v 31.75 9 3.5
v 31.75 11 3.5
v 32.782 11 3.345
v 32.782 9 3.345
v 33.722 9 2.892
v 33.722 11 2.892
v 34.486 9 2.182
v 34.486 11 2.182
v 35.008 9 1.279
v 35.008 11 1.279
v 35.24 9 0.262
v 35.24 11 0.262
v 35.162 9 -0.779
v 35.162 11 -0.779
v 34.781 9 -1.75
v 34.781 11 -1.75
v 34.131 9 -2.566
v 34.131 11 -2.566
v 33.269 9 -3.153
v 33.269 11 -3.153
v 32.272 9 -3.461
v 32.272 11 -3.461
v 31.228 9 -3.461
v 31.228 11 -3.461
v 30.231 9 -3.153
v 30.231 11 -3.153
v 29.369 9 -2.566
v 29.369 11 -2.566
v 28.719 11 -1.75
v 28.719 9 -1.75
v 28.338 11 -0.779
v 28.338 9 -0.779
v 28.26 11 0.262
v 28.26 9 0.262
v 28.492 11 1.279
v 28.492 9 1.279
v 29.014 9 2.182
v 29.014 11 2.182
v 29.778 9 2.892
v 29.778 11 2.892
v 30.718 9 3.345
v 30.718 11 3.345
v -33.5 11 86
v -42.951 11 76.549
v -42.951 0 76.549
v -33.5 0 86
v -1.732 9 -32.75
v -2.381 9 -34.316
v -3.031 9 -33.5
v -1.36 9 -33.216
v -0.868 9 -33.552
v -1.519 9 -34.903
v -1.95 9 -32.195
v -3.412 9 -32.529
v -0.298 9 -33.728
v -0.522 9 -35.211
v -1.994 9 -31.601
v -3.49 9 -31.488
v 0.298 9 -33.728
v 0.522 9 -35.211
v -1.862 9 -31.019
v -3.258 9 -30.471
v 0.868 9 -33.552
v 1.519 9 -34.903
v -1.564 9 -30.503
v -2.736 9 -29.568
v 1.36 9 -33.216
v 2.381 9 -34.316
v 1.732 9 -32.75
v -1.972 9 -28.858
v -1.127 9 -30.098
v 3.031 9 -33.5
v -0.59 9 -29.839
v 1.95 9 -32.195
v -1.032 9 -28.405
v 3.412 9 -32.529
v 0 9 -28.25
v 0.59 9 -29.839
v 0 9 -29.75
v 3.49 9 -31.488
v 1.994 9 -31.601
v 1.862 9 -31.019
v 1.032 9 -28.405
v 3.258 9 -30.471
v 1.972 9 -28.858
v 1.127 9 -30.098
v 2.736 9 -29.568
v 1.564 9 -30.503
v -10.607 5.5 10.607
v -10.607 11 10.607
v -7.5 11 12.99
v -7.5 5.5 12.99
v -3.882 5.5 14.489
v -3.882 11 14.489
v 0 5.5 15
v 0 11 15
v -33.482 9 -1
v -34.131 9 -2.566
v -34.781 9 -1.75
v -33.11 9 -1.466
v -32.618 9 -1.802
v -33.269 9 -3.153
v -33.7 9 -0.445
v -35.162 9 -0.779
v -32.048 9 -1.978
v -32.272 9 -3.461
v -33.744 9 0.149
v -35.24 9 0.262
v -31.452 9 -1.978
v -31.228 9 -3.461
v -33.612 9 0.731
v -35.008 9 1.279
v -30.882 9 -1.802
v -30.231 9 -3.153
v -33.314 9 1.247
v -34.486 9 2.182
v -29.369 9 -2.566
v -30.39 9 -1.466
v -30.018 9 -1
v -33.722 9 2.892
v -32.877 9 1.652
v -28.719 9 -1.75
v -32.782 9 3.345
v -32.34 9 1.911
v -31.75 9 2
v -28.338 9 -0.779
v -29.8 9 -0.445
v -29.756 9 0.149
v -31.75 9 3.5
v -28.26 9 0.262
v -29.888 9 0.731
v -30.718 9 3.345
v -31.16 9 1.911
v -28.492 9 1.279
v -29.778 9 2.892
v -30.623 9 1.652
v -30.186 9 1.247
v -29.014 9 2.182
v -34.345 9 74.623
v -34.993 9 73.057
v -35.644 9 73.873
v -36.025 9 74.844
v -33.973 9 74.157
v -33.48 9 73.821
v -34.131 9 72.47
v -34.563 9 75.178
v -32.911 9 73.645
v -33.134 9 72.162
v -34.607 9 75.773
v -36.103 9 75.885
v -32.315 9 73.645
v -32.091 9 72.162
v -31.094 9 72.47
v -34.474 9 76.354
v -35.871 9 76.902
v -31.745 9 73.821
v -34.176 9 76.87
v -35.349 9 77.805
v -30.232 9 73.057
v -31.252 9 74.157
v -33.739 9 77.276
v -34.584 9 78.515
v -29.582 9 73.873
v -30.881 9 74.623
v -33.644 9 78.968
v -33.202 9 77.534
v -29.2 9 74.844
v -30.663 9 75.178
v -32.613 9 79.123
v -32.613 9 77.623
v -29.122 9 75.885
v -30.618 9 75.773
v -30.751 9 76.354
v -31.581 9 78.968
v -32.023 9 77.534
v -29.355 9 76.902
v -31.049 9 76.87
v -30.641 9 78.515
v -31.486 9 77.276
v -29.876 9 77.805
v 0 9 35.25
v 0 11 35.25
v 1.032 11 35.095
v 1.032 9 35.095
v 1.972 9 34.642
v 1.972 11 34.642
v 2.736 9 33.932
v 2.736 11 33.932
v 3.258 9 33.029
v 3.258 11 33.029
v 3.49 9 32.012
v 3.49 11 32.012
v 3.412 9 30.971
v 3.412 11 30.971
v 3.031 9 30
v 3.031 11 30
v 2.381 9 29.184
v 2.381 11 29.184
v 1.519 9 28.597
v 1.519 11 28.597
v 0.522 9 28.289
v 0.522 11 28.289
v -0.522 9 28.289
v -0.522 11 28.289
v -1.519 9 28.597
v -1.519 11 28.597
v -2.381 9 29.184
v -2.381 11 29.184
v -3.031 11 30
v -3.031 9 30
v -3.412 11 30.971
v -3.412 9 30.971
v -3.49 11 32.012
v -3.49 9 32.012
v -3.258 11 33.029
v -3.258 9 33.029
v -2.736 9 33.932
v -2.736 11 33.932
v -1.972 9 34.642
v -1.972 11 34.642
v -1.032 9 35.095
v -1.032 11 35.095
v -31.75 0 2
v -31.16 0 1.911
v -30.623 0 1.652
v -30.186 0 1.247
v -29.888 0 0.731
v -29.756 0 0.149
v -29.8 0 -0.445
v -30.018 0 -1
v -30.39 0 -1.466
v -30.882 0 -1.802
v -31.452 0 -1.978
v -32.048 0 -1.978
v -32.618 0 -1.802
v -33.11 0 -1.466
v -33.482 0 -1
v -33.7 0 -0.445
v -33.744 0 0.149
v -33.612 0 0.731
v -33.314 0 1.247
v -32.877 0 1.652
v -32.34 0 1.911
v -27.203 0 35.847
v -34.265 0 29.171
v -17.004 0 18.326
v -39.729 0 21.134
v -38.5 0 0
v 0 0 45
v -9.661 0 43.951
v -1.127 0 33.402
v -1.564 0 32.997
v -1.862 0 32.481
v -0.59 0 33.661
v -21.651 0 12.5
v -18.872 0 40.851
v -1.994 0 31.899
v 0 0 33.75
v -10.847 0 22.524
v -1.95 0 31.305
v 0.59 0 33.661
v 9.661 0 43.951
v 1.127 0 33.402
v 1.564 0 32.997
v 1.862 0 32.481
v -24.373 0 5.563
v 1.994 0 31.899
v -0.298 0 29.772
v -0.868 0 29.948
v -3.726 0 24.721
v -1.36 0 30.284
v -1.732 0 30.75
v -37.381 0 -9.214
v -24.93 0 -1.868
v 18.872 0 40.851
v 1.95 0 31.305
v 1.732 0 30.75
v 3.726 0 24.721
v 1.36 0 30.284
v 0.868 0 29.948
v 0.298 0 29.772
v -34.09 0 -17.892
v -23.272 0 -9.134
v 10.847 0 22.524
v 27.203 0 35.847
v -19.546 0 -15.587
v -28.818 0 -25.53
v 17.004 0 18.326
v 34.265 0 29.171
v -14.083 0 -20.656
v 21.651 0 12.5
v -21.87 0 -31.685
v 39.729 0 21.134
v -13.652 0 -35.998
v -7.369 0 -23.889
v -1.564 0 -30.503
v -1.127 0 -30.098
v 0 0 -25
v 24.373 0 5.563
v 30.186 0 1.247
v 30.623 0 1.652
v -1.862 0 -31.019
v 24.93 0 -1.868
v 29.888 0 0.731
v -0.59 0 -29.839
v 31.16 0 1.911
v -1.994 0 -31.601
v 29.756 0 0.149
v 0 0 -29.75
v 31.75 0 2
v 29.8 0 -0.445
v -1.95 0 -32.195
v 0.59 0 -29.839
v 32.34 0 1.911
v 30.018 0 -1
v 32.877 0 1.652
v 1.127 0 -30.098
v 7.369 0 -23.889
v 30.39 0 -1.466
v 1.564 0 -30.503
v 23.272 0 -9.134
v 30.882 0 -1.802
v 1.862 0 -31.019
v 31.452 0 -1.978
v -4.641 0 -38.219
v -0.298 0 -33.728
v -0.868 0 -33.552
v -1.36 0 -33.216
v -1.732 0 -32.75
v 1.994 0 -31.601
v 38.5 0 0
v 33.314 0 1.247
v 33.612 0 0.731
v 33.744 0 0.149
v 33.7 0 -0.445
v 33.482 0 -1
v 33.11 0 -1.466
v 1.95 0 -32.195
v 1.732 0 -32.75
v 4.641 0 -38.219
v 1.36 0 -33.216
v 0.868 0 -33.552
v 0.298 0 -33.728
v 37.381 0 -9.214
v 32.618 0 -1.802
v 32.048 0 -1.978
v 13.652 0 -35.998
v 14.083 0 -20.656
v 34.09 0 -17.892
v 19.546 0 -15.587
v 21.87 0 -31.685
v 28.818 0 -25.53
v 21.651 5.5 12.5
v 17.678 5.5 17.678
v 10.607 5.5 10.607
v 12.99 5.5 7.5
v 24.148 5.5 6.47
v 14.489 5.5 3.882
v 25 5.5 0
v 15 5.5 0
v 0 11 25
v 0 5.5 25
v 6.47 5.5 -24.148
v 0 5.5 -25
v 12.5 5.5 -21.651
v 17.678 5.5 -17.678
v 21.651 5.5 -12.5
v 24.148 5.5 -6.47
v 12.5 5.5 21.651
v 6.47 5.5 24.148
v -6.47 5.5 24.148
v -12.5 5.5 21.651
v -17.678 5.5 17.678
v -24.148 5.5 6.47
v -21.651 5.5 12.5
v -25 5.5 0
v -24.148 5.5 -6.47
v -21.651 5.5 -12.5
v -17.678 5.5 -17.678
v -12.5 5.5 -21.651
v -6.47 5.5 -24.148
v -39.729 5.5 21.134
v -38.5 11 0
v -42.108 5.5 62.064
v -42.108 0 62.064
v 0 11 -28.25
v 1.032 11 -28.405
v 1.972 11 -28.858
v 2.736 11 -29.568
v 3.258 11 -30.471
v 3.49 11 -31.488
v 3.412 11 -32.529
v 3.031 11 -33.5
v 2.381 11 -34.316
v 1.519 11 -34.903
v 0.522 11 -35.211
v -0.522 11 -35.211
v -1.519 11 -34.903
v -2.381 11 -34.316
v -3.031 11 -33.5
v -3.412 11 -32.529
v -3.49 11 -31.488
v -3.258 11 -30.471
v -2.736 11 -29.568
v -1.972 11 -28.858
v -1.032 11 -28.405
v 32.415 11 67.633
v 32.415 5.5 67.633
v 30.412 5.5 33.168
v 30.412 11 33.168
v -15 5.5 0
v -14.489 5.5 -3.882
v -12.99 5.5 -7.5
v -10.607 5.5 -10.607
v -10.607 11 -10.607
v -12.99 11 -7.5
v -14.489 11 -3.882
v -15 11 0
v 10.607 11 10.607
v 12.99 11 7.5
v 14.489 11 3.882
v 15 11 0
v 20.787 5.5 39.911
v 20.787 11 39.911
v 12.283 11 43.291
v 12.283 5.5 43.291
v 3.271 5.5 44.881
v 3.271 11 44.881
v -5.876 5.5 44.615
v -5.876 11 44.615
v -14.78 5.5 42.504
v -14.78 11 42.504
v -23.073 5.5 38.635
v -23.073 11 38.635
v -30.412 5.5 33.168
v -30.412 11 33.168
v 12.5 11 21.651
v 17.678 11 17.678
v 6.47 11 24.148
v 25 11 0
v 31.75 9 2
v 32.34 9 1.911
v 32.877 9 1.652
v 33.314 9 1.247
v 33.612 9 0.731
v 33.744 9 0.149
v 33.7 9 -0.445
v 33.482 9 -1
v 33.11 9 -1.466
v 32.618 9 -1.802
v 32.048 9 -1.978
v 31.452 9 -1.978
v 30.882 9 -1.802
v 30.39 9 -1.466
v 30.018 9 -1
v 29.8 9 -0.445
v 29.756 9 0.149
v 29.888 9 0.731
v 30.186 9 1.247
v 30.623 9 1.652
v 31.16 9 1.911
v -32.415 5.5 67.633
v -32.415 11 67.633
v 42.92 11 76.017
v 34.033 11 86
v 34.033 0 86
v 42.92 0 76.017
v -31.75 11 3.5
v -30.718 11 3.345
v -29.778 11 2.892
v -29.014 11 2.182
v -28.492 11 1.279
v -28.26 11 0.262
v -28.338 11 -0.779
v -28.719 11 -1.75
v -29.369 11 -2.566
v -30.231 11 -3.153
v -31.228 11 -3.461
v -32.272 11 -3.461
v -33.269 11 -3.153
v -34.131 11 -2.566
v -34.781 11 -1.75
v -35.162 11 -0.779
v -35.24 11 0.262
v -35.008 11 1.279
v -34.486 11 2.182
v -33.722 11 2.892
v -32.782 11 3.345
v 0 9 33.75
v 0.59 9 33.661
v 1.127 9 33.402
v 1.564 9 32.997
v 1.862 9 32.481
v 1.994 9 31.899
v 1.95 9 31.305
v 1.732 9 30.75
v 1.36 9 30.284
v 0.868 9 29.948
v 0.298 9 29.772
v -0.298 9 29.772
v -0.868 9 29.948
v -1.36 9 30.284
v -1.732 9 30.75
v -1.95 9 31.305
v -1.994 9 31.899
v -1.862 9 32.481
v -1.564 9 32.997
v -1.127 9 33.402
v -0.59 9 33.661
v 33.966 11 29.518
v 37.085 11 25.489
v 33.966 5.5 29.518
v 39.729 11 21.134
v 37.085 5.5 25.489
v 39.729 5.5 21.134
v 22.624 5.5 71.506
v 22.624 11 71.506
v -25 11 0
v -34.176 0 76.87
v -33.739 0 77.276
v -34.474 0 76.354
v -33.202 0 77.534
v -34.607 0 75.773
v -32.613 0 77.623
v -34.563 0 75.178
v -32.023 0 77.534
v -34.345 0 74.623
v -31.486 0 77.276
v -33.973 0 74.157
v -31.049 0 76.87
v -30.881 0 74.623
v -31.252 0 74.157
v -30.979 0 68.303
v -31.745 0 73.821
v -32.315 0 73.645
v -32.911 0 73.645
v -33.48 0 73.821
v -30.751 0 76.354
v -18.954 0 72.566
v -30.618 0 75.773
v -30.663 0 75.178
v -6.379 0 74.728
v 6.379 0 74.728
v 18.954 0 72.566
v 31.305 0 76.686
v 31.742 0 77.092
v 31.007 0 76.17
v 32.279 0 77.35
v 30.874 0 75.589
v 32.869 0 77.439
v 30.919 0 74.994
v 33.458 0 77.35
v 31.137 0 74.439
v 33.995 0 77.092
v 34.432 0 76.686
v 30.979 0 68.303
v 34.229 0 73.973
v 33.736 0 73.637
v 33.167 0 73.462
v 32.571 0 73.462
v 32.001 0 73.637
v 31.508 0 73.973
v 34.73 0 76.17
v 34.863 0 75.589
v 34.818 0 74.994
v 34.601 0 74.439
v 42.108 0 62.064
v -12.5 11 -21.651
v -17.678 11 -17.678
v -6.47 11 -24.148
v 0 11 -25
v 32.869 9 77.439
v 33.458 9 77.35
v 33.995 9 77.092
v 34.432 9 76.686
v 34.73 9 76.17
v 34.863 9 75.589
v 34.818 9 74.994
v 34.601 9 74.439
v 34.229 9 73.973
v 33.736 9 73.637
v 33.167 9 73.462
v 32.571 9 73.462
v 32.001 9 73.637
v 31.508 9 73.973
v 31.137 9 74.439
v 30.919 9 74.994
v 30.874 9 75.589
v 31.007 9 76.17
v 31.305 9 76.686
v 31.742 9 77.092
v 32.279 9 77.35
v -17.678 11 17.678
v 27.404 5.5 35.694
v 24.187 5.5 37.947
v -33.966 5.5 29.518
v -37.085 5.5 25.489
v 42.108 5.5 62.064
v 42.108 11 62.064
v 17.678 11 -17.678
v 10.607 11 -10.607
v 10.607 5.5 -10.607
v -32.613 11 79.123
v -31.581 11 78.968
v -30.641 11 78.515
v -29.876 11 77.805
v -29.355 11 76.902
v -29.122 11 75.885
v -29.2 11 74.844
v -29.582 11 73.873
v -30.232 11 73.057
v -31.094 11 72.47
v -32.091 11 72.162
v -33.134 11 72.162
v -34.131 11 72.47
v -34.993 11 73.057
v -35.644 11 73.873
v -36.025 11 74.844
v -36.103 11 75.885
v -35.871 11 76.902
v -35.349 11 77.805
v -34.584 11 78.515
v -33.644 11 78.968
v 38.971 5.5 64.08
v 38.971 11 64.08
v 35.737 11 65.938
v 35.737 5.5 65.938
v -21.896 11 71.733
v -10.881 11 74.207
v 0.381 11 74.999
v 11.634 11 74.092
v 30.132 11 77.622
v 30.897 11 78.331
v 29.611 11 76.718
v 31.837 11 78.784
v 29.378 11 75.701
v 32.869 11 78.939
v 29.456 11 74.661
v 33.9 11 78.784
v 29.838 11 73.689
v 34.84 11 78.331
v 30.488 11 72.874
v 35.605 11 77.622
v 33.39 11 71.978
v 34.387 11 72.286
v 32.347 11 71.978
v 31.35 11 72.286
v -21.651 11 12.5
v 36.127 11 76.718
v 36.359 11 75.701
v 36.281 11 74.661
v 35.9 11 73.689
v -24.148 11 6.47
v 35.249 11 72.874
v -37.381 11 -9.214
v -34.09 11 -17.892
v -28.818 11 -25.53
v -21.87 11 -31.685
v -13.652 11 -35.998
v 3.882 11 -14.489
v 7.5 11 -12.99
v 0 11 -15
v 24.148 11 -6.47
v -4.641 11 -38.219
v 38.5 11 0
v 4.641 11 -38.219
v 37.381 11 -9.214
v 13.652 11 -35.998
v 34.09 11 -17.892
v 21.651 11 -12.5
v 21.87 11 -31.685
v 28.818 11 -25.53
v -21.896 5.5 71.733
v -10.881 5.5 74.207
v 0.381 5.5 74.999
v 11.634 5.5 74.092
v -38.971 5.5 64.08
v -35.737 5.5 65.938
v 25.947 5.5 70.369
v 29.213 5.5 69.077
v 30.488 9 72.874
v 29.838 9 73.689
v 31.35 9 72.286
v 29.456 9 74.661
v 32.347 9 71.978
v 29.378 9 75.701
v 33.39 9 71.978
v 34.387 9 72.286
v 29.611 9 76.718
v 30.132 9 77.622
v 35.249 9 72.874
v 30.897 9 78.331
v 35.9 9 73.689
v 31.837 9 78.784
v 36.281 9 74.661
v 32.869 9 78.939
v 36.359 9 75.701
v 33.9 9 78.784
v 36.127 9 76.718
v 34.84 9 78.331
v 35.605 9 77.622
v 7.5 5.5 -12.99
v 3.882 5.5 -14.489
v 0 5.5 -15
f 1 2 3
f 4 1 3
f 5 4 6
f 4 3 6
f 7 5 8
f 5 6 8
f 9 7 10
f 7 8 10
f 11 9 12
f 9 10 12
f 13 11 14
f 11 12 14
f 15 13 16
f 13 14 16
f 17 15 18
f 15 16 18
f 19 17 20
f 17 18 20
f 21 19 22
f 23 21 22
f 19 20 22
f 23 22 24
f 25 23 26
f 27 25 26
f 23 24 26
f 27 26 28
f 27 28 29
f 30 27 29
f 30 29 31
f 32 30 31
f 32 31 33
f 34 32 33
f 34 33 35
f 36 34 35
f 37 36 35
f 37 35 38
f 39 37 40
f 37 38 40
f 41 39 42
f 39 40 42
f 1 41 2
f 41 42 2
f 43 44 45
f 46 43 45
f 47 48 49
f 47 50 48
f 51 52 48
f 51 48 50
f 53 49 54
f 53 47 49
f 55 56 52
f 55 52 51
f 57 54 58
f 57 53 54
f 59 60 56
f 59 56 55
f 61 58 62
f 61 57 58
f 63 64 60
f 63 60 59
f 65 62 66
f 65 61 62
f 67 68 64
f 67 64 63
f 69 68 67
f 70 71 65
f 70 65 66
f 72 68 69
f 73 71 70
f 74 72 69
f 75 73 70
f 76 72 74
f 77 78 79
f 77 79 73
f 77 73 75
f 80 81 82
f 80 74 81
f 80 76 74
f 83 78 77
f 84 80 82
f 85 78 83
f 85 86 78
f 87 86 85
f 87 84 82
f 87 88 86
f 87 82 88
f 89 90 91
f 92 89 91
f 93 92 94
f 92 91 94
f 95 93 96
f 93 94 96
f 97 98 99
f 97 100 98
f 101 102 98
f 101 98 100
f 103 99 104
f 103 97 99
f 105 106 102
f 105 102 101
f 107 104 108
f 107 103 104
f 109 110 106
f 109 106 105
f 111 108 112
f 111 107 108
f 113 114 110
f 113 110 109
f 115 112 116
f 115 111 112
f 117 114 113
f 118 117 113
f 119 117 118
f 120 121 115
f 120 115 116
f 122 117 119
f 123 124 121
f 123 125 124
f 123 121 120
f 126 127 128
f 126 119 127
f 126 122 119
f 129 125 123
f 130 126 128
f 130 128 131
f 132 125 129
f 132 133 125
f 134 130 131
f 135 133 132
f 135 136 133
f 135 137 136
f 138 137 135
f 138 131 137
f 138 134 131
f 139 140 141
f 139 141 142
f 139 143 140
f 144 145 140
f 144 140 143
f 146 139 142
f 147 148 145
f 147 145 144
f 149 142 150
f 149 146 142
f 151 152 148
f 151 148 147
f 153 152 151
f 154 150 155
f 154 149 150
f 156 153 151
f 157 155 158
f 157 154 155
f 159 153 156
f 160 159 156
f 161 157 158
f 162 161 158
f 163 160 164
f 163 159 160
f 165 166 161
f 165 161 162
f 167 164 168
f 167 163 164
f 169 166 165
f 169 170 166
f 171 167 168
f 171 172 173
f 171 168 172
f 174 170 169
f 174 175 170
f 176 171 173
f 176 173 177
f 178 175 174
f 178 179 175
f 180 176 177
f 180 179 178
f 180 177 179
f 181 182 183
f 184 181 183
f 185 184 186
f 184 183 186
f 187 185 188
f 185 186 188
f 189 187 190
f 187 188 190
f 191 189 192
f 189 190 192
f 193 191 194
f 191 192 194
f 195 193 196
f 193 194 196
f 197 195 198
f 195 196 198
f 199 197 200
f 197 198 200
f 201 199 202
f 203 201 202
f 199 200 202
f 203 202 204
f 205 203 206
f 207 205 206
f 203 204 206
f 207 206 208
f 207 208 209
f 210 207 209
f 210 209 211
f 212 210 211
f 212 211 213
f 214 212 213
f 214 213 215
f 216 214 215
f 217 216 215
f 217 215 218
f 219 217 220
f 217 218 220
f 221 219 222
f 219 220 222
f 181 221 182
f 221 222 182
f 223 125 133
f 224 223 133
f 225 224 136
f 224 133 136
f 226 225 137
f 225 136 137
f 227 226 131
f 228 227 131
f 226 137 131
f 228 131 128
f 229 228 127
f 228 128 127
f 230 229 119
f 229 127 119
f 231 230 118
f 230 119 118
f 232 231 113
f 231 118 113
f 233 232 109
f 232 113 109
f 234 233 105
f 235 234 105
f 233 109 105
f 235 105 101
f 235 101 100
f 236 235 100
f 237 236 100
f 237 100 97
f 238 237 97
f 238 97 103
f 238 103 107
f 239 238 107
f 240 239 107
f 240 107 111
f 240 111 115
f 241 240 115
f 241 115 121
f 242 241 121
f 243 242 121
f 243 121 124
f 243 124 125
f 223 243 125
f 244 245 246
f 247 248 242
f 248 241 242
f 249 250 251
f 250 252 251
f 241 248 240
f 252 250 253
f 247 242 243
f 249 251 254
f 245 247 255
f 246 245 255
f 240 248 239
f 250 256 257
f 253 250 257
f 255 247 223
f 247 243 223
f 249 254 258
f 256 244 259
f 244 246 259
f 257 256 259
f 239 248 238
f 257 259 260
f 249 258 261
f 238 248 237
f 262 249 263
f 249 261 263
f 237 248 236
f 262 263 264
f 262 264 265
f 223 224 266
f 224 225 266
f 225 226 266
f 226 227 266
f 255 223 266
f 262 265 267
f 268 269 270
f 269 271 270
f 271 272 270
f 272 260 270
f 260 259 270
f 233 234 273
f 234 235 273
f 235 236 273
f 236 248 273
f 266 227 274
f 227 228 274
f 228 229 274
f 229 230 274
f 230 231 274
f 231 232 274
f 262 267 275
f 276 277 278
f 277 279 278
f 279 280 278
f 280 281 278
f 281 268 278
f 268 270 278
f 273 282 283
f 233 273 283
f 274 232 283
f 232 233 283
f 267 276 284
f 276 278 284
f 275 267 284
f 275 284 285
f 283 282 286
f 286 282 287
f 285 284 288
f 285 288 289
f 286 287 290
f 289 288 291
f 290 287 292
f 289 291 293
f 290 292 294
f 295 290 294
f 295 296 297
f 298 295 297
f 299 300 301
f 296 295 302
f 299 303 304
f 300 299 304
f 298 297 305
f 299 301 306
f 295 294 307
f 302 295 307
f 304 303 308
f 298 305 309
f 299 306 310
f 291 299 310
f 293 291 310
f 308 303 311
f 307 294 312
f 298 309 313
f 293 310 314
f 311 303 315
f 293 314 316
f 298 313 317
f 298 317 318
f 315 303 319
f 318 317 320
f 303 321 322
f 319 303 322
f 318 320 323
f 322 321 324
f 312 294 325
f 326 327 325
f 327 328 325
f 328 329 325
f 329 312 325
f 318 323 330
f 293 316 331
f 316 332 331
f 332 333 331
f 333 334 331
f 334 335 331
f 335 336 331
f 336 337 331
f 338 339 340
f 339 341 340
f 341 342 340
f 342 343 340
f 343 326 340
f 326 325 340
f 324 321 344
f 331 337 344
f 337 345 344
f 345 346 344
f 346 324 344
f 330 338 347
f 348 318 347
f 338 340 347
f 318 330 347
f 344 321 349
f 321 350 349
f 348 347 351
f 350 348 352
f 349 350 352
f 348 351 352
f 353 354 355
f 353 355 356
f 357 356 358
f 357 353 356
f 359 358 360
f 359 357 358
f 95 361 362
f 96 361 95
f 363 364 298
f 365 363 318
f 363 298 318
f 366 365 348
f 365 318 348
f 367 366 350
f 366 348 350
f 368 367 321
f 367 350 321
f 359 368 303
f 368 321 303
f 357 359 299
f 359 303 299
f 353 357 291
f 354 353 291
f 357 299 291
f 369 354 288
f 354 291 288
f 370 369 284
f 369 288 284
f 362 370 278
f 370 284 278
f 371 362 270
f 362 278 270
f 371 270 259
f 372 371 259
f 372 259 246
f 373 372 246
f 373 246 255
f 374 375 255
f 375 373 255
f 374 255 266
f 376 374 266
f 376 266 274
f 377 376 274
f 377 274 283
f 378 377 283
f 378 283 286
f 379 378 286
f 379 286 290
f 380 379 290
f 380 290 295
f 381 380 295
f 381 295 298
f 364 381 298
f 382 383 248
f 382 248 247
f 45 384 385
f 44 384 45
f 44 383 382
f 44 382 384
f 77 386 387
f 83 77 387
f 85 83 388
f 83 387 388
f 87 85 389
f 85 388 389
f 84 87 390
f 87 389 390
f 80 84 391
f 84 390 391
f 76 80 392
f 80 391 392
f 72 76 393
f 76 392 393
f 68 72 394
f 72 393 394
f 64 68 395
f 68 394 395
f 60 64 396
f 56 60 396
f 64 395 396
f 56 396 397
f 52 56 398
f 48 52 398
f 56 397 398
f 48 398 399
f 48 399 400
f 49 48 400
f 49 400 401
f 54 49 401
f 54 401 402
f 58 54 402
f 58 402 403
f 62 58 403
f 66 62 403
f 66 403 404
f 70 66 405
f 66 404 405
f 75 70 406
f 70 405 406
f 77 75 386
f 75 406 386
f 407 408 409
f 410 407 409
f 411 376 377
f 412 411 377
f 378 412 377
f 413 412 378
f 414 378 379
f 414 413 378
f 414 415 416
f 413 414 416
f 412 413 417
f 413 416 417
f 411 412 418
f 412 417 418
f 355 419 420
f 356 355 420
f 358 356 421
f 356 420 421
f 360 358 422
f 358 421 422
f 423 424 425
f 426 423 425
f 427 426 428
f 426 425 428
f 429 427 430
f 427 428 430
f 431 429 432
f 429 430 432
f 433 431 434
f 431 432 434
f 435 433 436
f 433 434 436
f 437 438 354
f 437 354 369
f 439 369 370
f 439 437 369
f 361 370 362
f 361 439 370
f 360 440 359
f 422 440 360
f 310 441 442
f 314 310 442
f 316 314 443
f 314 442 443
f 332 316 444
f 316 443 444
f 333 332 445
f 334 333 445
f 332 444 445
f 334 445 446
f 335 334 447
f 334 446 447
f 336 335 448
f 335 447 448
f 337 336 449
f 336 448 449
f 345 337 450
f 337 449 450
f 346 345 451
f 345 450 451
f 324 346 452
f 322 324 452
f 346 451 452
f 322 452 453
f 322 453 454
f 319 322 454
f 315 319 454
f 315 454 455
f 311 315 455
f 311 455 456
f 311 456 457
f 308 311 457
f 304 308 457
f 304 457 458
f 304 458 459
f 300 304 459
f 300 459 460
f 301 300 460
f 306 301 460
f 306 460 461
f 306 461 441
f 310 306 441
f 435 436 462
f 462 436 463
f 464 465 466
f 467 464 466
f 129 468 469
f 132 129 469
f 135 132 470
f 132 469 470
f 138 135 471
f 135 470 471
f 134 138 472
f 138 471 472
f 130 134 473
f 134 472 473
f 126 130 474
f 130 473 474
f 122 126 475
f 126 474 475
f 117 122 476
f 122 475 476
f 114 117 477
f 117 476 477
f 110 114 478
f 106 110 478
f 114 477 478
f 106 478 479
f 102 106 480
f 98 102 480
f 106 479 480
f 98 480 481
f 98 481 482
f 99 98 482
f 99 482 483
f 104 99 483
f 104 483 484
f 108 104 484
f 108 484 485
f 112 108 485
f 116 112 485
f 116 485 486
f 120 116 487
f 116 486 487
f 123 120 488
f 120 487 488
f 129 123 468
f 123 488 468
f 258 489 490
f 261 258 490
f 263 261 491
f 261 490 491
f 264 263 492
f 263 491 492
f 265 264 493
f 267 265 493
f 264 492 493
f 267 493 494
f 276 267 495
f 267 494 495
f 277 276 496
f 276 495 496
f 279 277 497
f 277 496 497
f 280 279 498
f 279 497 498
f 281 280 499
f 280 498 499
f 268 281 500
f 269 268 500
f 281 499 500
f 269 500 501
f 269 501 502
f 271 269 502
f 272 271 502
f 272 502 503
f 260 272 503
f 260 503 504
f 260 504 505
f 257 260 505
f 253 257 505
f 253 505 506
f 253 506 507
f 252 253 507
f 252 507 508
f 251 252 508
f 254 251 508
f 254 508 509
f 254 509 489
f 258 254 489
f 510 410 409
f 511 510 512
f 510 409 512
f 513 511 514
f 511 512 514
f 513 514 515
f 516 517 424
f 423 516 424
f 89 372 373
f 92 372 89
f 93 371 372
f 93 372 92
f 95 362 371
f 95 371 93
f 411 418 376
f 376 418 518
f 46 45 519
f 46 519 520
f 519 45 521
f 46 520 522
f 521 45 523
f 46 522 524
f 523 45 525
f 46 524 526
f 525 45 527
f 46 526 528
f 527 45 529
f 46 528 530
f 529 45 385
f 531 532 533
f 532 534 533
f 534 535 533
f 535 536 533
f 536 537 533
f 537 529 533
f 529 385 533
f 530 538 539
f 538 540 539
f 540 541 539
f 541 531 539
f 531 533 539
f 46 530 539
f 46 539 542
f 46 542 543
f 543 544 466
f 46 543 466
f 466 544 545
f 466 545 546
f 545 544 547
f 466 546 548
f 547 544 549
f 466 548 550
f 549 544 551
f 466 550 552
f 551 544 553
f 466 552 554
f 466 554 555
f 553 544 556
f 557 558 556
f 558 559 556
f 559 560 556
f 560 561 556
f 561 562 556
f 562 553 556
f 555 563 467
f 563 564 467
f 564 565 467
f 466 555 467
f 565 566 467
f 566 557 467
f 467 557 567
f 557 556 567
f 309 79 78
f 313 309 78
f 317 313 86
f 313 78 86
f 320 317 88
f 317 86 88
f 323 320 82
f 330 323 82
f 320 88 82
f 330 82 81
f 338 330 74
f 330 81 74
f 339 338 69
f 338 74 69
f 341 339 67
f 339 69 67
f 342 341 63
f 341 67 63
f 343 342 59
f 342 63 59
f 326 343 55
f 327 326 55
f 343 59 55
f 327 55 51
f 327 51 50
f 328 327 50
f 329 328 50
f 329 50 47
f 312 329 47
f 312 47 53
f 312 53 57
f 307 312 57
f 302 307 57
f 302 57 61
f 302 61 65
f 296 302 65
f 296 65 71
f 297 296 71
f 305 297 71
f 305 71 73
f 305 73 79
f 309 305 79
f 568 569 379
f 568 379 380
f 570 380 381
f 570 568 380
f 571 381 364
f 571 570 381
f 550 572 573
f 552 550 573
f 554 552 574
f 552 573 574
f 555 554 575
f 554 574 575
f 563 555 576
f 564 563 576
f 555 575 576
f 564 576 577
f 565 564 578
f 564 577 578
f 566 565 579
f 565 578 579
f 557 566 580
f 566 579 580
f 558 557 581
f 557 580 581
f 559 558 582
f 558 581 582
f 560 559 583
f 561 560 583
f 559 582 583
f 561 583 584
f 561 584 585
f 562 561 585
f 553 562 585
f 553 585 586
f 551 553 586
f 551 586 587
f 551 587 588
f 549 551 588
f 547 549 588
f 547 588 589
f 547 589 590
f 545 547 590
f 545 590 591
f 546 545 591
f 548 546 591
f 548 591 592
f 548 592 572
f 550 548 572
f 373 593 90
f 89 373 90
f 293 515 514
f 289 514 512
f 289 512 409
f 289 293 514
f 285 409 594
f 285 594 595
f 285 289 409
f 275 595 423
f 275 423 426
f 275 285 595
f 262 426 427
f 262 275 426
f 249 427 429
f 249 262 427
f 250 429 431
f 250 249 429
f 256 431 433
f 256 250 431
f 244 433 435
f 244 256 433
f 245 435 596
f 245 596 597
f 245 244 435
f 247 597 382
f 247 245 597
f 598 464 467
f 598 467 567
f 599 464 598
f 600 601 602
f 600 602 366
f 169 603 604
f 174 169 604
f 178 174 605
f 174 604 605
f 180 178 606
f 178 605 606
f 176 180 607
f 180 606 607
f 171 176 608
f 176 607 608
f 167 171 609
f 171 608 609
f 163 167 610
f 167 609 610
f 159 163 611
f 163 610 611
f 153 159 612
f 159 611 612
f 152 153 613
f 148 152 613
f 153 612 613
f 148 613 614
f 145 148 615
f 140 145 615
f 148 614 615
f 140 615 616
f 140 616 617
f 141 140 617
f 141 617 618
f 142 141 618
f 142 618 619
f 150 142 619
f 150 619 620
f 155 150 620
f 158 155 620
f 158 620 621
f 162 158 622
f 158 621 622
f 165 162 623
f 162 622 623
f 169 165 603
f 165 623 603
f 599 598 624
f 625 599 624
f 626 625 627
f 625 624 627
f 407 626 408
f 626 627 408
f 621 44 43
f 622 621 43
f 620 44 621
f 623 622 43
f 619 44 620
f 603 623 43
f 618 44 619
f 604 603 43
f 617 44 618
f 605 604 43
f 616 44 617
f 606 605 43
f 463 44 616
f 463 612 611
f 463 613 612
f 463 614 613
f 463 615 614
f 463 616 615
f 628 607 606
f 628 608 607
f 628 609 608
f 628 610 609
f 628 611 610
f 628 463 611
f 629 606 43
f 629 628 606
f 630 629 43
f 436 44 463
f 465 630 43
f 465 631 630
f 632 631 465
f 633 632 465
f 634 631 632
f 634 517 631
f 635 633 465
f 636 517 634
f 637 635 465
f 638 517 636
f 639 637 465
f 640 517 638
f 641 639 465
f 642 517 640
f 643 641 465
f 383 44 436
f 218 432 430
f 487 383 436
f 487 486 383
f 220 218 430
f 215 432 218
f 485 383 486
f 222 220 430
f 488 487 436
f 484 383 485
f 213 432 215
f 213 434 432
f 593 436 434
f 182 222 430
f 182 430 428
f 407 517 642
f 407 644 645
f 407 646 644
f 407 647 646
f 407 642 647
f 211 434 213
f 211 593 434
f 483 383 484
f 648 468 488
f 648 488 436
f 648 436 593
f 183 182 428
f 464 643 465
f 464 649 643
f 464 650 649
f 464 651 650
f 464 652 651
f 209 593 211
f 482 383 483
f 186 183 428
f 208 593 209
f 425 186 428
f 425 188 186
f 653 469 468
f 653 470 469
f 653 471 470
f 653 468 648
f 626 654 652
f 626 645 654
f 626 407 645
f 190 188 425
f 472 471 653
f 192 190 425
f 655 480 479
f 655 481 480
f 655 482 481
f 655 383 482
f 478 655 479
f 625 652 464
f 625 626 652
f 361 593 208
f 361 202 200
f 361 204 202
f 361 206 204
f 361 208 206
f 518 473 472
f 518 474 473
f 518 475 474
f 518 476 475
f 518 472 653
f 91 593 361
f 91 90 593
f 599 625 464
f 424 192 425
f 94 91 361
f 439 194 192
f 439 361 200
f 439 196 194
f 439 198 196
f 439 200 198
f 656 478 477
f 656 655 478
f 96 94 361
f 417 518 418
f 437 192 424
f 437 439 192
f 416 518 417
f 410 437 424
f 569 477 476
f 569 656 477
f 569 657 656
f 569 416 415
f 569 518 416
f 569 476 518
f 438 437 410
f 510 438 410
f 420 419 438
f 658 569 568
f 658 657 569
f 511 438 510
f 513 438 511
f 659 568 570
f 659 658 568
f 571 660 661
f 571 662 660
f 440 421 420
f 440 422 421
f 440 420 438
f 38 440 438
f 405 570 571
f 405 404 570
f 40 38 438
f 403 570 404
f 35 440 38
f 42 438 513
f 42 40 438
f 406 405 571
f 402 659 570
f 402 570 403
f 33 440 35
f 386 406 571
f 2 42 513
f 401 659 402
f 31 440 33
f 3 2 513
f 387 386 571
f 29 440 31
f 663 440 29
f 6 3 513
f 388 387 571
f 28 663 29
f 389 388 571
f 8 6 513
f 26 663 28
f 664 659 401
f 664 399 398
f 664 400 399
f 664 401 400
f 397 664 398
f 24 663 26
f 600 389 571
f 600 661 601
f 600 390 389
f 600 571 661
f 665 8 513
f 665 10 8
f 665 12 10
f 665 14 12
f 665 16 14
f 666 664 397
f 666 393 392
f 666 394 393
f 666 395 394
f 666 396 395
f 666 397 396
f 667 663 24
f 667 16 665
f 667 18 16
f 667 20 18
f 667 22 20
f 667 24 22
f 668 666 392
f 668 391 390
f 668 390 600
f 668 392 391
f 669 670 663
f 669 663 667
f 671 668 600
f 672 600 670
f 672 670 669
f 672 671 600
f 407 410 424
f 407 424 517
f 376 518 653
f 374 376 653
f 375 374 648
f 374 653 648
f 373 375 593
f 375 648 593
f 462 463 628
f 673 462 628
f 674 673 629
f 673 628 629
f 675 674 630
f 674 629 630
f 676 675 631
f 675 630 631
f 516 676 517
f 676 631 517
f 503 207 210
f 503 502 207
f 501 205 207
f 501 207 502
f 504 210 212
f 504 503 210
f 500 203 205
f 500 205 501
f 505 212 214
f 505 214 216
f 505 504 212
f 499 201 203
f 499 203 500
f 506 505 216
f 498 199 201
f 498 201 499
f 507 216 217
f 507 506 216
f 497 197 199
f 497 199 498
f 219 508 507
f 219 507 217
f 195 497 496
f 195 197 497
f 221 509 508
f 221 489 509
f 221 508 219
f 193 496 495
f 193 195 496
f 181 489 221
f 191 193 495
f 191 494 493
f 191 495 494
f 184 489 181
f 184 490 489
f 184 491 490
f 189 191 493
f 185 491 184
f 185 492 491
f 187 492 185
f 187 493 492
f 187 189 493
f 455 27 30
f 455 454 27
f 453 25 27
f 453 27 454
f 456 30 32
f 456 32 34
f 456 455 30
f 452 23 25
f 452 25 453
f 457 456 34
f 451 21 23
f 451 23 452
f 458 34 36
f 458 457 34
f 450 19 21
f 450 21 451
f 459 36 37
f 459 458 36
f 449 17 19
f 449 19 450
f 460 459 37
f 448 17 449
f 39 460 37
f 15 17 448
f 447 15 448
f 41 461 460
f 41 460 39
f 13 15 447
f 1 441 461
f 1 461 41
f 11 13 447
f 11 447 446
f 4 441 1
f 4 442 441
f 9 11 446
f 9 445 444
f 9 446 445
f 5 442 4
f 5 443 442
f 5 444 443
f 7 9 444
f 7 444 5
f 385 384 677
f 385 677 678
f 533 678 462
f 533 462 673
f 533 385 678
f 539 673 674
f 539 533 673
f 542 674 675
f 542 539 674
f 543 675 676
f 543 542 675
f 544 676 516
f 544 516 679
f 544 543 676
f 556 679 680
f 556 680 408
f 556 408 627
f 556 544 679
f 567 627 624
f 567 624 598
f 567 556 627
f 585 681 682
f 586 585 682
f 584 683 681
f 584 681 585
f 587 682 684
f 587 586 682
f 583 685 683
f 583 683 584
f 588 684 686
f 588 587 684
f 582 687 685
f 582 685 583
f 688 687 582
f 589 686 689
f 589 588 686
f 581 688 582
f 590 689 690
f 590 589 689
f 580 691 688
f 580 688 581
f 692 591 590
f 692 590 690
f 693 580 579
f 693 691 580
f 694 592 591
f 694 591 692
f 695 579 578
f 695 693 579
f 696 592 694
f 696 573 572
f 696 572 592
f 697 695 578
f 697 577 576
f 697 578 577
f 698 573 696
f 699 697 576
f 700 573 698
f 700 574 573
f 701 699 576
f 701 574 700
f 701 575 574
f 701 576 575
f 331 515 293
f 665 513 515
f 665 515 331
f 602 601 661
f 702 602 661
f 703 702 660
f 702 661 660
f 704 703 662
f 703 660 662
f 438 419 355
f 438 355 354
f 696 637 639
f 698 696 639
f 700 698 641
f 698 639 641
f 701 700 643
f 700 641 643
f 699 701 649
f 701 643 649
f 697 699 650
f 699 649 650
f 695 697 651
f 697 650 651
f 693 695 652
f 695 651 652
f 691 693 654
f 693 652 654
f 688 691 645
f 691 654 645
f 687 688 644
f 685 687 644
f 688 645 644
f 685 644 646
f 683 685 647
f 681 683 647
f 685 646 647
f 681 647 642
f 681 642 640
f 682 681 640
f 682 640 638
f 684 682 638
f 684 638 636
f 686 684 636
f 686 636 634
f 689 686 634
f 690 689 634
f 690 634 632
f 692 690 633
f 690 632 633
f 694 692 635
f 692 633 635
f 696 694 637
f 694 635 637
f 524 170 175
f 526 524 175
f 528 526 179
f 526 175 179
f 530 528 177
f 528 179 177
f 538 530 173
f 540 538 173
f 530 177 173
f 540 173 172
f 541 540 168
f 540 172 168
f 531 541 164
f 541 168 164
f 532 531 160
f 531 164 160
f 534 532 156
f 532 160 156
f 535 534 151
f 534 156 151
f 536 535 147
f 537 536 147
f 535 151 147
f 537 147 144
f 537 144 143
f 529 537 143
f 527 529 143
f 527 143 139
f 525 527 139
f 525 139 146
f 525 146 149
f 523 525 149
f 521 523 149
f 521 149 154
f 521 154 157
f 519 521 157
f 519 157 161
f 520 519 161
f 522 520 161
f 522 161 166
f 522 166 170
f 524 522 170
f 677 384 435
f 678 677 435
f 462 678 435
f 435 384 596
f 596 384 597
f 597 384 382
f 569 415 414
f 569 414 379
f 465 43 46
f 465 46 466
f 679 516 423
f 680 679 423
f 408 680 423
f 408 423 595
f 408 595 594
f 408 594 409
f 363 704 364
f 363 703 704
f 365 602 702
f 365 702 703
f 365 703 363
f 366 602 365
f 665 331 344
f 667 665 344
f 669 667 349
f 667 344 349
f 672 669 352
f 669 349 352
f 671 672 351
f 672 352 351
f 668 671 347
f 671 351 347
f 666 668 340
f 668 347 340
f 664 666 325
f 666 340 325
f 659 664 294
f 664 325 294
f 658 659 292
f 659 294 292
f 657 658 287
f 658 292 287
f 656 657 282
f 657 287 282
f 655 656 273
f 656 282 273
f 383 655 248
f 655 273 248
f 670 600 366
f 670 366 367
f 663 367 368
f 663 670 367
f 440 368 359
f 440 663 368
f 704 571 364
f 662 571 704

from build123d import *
from OCP.BRepFilletAPI import BRepFilletAPI_MakeChamfer
from build123d.topology import SkipClean

# Parameters (mm, degrees)
SKETCH1_R           = 38.5
BOSS_EXTRUDE1_DEPTH = 11
BOSS_EXTRUDE2_DEPTH = 11
CHAMFER1_SIZE       = 10
CHAMFER1_SIZE2      = 9.466508376
SKETCH3_R           = 15
CUT_EXTRUDE1_DEPTH  = 97.756135196
SKETCH4_R           = 25
CUT_EXTRUDE2_DEPTH  = 5.5
CUT_EXTRUDE3_DEPTH  = 5.5
CUT_EXTRUDE5_DEPTH  = 5.5
CUT_EXTRUDE6_DEPTH  = 5.5
SKETCH9_R           = 3.5
CUT_EXTRUDE7_DEPTH  = 2
SKETCH10_R          = 2
CUT_EXTRUDE8_DEPTH  = 97.549208687
CUT_EXTRUDE9_DEPTH  = 97.286030649
SKETCH13_R          = 2
CUT_EXTRUDE10_DEPTH = 97.756135196
SKETCH14_R          = 3.5
CUT_EXTRUDE11_DEPTH = 2


with BuildPart() as part:
    # Sketch1 → Boss-Extrude1 (new body)
    with BuildSketch(Plane(origin=(0, 0, 0), x_dir=(1, 0, 0), z_dir=(0, 1, 0))):
        with Locations(Location((0, 0, 0), (0, 0, 270))):
            Circle(SKETCH1_R)
    extrude(amount=BOSS_EXTRUDE1_DEPTH)

    # Sketch2 → Boss-Extrude2 (add, through all)
    with BuildSketch(Plane(origin=(0, 11, 0), x_dir=(1, 0, 0), z_dir=(0, 1, 0))):
        with BuildLine():
            Line((-38.5, 0), (-43.5, -86))
            Line((-43.5, -86), (43.5, -86))
            Line((43.5, -86), (38.5, 0))
            ThreePointArc((38.5, 0), (0, -38.5), (-38.5, 0))
        make_face()
    extrude(amount=-BOSS_EXTRUDE2_DEPTH)

    # Chamfer1: one chamfer whose edges measure the first distance from different faces: ONE call of the kernel's chamfer builder (chamfer() names one face for all edges)
    chamfer1_edges_1 = [part.edges().sort_by_distance(p)[0] for p in [
        (43.5, 5.5, 86),
    ]]
    chamfer1_side_1 = [part.faces().sort_by_distance(p)[0] for p in [
        (41, 5.5, 43),
    ]]
    chamfer1_edges_2 = [part.edges().sort_by_distance(p)[0] for p in [
        (-43.5, 5.5, 86),
    ]]
    chamfer1_side_2 = [part.faces().sort_by_distance(p)[0] for p in [
        (0, 5.5, 86),
    ]]
    chamfer1 = BRepFilletAPI_MakeChamfer(part.part.solid().wrapped)
    for e in chamfer1_edges_1:
        chamfer1.Add(CHAMFER1_SIZE, CHAMFER1_SIZE2, e.wrapped, chamfer1_side_1[0].wrapped)  # the first distance lies on this face
    for e in chamfer1_edges_2:
        chamfer1.Add(CHAMFER1_SIZE, CHAMFER1_SIZE2, e.wrapped, chamfer1_side_2[0].wrapped)  # the first distance lies on this face
    add(Compound.cast(chamfer1.Shape()), mode=Mode.REPLACE)

    # Sketch3 → Cut-Extrude1 (cut, through all)
    with BuildSketch(Plane(origin=(0, 11, 0), x_dir=(1, 0, 0), z_dir=(0, 1, 0))):
        with Locations(Location((0, 0, 0), (0, 0, 270))):
            Circle(SKETCH3_R)
    extrude(amount=-CUT_EXTRUDE1_DEPTH, mode=Mode.SUBTRACT)

    # Sketch4 → Cut-Extrude2 (cut)
    with BuildSketch(Plane.XZ):
        with Locations(Location((0, 0, 0), (0, 0, 270))):
            Circle(SKETCH4_R)
    extrude(amount=-CUT_EXTRUDE2_DEPTH, mode=Mode.SUBTRACT)

    # Sketch5 → Cut-Extrude3 (cut)
    with SkipClean():  # the faces are left unmerged after this step: merging them gives an invalid solid
        with BuildSketch(Plane(origin=(0, 11, 0), x_dir=(1, 0, 0), z_dir=(0, 1, 0))):
            with BuildLine():
                Line((25, 0), (15, 0))
                ThreePointArc((15, 0), (13.858192988, 5.740251485), (10.606601718, 10.606601718))
                Line((10.606601718, 10.606601718), (17.67766953, 17.67766953))
                ThreePointArc((17.67766953, 17.67766953), (23.096988313, 9.567085809), (25, 0))
            make_face()
            with BuildLine():
                Line((0, 25), (0, 15))
                ThreePointArc((0, 15), (-5.740251485, 13.858192988), (-10.606601718, 10.606601718))
                Line((-10.606601718, 10.606601718), (-17.67766953, 17.67766953))
                ThreePointArc((-17.67766953, 17.67766953), (-9.567085809, 23.096988313), (0, 25))
            make_face()
            with BuildLine():
                Line((10.606601718, -10.606601718), (17.67766953, -17.67766953))
                ThreePointArc((17.67766953, -17.67766953), (9.567085809, -23.096988313), (0, -25))
                Line((0, -25), (0, -15))
                ThreePointArc((0, -15), (5.740251485, -13.858192988), (10.606601718, -10.606601718))
            make_face()
            with BuildLine():
                Line((-15, 0), (-25, 0))
                ThreePointArc((-25, 0), (-23.096988313, -9.567085809), (-17.67766953, -17.67766953))
                Line((-17.67766953, -17.67766953), (-10.606601718, -10.606601718))
                ThreePointArc((-10.606601718, -10.606601718), (-13.858192988, -5.740251485), (-15, 0))
            make_face()
        extrude(amount=-CUT_EXTRUDE3_DEPTH, mode=Mode.SUBTRACT)

    # Sketch7 → Cut-Extrude5 (cut)
    with SkipClean():  # the faces are left unmerged after this step: merging them gives an invalid solid
        with BuildSketch(Plane(origin=(0, 0, 0), x_dir=(1, 0, 0), z_dir=(0, 1, 0))):
            with BuildLine():
                Line((42.108347266, -62.063572976), (39.728699574, -21.133632677))
                ThreePointArc((39.728699574, -21.133632677), (0, -45), (-39.728699574, -21.133632677))
                Line((-39.728699574, -21.133632677), (-42.108347266, -62.063572976))
                ThreePointArc((-42.108347266, -62.063572976), (0, -75), (42.108347266, -62.063572976))
            make_face()
        extrude(amount=CUT_EXTRUDE5_DEPTH, mode=Mode.SUBTRACT)

    # Sketch8 → Cut-Extrude6 (cut)
    with SkipClean():  # the faces are left unmerged after this step: merging them gives an invalid solid
        with BuildSketch(Plane(origin=(0, 11, 0), x_dir=(1, 0, 0), z_dir=(0, 1, 0))):
            with BuildLine():
                Line((-30.411506405, -33.168362609), (-32.415276079, -67.633200994))
                ThreePointArc((-32.415276079, -67.633200994), (-5.264965928, -74.814972658), (22.623578731, -71.506459047))
                Line((22.623578731, -71.506459047), (20.786653197, -39.911339853))
                ThreePointArc((20.786653197, -39.911339853), (-5.875915703, -44.614724191), (-30.411506405, -33.168362609))
            make_face()
        extrude(amount=-CUT_EXTRUDE6_DEPTH, mode=Mode.SUBTRACT)

    # Sketch9 → Cut-Extrude7 (cut)
    with SkipClean():  # the faces are left unmerged after this step: merging them gives an invalid solid
        with BuildSketch(Plane(origin=(0, 11, 0), x_dir=(1, 0, 0), z_dir=(0, 1, 0))):
            with Locations(Location((-31.75, 0, 0), (0, 0, 270))):
                Circle(SKETCH9_R)
            with Locations(Location((0, 31.75, 0), (0, 0, 270))):
                Circle(SKETCH9_R)
            with Locations(Location((31.75, 0, 0), (0, 0, 270))):
                Circle(SKETCH9_R)
            with Locations(Location((0, -31.75, 0), (0, 0, 270))):
                Circle(SKETCH9_R)
        extrude(amount=-CUT_EXTRUDE7_DEPTH, mode=Mode.SUBTRACT)

    # Sketch10 → Cut-Extrude8 (cut, through all)
    with SkipClean():  # the faces are left unmerged after this step: merging them gives an invalid solid
        with BuildSketch(Plane(origin=(0, 9, 0), x_dir=(1, 0, 0), z_dir=(0, 1, 0))):
            with Locations(Location((-31.75, 0, 0), (0, 0, 270))):
                Circle(SKETCH10_R)
            with Locations(Location((0, 31.75, 0), (0, 0, 270))):
                Circle(SKETCH10_R)
            with Locations(Location((31.75, 0, 0), (0, 0, 270))):
                Circle(SKETCH10_R)
            with Locations(Location((0, -31.75, 0), (0, 0, 270))):
                Circle(SKETCH10_R)
        extrude(amount=-CUT_EXTRUDE8_DEPTH, mode=Mode.SUBTRACT)

    # Sketch11 → Cut-Extrude9 (cut, through all)
    with SkipClean():  # the faces are left unmerged after this step: merging them gives an invalid solid
        with BuildSketch(Plane.XZ.offset(-5.5)):
            with BuildLine():
                Line((39.728699574, 21.133632677), (42.108347266, 62.063572976))
                ThreePointArc((42.108347266, 62.063572976), (37.365730264, 65.029241129), (32.415276079, 67.633200994))
                Line((32.415276079, 67.633200994), (30.411506405, 33.168362609))
                ThreePointArc((30.411506405, 33.168362609), (35.582591317, 27.547762072), (39.728699574, 21.133632677))
            make_face()
        extrude(amount=-CUT_EXTRUDE9_DEPTH, mode=Mode.SUBTRACT)

    # Sketch13 → Cut-Extrude10 (cut, through all)
    with SkipClean():  # the faces are left unmerged after this step: merging them gives an invalid solid
        with BuildSketch(Plane(origin=(0, 11, 0), x_dir=(1, 0, 0), z_dir=(0, 1, 0))):
            with Locations(Location((-32.612704984, -75.623047913, 0), (0, 0, 270))):
                Circle(SKETCH13_R)
            with Locations(Location((32.868643167, -75.439338775, 0), (0, 0, 270))):
                Circle(SKETCH13_R)
        extrude(amount=-CUT_EXTRUDE10_DEPTH, mode=Mode.SUBTRACT)

    # Sketch14 → Cut-Extrude11 (cut)
    with SkipClean():  # the faces are left unmerged after this step: merging them gives an invalid solid
        with BuildSketch(Plane(origin=(0, 11, 0), x_dir=(1, 0, 0), z_dir=(0, 1, 0))):
            with Locations(Location((-32.612704984, -75.623047913, 0), (0, 0, 270))):
                Circle(SKETCH14_R)
            with Locations(Location((32.868643167, -75.439338775, 0), (0, 0, 270))):
                Circle(SKETCH14_R)
        extrude(amount=-CUT_EXTRUDE11_DEPTH, mode=Mode.SUBTRACT)


solid = part.part
